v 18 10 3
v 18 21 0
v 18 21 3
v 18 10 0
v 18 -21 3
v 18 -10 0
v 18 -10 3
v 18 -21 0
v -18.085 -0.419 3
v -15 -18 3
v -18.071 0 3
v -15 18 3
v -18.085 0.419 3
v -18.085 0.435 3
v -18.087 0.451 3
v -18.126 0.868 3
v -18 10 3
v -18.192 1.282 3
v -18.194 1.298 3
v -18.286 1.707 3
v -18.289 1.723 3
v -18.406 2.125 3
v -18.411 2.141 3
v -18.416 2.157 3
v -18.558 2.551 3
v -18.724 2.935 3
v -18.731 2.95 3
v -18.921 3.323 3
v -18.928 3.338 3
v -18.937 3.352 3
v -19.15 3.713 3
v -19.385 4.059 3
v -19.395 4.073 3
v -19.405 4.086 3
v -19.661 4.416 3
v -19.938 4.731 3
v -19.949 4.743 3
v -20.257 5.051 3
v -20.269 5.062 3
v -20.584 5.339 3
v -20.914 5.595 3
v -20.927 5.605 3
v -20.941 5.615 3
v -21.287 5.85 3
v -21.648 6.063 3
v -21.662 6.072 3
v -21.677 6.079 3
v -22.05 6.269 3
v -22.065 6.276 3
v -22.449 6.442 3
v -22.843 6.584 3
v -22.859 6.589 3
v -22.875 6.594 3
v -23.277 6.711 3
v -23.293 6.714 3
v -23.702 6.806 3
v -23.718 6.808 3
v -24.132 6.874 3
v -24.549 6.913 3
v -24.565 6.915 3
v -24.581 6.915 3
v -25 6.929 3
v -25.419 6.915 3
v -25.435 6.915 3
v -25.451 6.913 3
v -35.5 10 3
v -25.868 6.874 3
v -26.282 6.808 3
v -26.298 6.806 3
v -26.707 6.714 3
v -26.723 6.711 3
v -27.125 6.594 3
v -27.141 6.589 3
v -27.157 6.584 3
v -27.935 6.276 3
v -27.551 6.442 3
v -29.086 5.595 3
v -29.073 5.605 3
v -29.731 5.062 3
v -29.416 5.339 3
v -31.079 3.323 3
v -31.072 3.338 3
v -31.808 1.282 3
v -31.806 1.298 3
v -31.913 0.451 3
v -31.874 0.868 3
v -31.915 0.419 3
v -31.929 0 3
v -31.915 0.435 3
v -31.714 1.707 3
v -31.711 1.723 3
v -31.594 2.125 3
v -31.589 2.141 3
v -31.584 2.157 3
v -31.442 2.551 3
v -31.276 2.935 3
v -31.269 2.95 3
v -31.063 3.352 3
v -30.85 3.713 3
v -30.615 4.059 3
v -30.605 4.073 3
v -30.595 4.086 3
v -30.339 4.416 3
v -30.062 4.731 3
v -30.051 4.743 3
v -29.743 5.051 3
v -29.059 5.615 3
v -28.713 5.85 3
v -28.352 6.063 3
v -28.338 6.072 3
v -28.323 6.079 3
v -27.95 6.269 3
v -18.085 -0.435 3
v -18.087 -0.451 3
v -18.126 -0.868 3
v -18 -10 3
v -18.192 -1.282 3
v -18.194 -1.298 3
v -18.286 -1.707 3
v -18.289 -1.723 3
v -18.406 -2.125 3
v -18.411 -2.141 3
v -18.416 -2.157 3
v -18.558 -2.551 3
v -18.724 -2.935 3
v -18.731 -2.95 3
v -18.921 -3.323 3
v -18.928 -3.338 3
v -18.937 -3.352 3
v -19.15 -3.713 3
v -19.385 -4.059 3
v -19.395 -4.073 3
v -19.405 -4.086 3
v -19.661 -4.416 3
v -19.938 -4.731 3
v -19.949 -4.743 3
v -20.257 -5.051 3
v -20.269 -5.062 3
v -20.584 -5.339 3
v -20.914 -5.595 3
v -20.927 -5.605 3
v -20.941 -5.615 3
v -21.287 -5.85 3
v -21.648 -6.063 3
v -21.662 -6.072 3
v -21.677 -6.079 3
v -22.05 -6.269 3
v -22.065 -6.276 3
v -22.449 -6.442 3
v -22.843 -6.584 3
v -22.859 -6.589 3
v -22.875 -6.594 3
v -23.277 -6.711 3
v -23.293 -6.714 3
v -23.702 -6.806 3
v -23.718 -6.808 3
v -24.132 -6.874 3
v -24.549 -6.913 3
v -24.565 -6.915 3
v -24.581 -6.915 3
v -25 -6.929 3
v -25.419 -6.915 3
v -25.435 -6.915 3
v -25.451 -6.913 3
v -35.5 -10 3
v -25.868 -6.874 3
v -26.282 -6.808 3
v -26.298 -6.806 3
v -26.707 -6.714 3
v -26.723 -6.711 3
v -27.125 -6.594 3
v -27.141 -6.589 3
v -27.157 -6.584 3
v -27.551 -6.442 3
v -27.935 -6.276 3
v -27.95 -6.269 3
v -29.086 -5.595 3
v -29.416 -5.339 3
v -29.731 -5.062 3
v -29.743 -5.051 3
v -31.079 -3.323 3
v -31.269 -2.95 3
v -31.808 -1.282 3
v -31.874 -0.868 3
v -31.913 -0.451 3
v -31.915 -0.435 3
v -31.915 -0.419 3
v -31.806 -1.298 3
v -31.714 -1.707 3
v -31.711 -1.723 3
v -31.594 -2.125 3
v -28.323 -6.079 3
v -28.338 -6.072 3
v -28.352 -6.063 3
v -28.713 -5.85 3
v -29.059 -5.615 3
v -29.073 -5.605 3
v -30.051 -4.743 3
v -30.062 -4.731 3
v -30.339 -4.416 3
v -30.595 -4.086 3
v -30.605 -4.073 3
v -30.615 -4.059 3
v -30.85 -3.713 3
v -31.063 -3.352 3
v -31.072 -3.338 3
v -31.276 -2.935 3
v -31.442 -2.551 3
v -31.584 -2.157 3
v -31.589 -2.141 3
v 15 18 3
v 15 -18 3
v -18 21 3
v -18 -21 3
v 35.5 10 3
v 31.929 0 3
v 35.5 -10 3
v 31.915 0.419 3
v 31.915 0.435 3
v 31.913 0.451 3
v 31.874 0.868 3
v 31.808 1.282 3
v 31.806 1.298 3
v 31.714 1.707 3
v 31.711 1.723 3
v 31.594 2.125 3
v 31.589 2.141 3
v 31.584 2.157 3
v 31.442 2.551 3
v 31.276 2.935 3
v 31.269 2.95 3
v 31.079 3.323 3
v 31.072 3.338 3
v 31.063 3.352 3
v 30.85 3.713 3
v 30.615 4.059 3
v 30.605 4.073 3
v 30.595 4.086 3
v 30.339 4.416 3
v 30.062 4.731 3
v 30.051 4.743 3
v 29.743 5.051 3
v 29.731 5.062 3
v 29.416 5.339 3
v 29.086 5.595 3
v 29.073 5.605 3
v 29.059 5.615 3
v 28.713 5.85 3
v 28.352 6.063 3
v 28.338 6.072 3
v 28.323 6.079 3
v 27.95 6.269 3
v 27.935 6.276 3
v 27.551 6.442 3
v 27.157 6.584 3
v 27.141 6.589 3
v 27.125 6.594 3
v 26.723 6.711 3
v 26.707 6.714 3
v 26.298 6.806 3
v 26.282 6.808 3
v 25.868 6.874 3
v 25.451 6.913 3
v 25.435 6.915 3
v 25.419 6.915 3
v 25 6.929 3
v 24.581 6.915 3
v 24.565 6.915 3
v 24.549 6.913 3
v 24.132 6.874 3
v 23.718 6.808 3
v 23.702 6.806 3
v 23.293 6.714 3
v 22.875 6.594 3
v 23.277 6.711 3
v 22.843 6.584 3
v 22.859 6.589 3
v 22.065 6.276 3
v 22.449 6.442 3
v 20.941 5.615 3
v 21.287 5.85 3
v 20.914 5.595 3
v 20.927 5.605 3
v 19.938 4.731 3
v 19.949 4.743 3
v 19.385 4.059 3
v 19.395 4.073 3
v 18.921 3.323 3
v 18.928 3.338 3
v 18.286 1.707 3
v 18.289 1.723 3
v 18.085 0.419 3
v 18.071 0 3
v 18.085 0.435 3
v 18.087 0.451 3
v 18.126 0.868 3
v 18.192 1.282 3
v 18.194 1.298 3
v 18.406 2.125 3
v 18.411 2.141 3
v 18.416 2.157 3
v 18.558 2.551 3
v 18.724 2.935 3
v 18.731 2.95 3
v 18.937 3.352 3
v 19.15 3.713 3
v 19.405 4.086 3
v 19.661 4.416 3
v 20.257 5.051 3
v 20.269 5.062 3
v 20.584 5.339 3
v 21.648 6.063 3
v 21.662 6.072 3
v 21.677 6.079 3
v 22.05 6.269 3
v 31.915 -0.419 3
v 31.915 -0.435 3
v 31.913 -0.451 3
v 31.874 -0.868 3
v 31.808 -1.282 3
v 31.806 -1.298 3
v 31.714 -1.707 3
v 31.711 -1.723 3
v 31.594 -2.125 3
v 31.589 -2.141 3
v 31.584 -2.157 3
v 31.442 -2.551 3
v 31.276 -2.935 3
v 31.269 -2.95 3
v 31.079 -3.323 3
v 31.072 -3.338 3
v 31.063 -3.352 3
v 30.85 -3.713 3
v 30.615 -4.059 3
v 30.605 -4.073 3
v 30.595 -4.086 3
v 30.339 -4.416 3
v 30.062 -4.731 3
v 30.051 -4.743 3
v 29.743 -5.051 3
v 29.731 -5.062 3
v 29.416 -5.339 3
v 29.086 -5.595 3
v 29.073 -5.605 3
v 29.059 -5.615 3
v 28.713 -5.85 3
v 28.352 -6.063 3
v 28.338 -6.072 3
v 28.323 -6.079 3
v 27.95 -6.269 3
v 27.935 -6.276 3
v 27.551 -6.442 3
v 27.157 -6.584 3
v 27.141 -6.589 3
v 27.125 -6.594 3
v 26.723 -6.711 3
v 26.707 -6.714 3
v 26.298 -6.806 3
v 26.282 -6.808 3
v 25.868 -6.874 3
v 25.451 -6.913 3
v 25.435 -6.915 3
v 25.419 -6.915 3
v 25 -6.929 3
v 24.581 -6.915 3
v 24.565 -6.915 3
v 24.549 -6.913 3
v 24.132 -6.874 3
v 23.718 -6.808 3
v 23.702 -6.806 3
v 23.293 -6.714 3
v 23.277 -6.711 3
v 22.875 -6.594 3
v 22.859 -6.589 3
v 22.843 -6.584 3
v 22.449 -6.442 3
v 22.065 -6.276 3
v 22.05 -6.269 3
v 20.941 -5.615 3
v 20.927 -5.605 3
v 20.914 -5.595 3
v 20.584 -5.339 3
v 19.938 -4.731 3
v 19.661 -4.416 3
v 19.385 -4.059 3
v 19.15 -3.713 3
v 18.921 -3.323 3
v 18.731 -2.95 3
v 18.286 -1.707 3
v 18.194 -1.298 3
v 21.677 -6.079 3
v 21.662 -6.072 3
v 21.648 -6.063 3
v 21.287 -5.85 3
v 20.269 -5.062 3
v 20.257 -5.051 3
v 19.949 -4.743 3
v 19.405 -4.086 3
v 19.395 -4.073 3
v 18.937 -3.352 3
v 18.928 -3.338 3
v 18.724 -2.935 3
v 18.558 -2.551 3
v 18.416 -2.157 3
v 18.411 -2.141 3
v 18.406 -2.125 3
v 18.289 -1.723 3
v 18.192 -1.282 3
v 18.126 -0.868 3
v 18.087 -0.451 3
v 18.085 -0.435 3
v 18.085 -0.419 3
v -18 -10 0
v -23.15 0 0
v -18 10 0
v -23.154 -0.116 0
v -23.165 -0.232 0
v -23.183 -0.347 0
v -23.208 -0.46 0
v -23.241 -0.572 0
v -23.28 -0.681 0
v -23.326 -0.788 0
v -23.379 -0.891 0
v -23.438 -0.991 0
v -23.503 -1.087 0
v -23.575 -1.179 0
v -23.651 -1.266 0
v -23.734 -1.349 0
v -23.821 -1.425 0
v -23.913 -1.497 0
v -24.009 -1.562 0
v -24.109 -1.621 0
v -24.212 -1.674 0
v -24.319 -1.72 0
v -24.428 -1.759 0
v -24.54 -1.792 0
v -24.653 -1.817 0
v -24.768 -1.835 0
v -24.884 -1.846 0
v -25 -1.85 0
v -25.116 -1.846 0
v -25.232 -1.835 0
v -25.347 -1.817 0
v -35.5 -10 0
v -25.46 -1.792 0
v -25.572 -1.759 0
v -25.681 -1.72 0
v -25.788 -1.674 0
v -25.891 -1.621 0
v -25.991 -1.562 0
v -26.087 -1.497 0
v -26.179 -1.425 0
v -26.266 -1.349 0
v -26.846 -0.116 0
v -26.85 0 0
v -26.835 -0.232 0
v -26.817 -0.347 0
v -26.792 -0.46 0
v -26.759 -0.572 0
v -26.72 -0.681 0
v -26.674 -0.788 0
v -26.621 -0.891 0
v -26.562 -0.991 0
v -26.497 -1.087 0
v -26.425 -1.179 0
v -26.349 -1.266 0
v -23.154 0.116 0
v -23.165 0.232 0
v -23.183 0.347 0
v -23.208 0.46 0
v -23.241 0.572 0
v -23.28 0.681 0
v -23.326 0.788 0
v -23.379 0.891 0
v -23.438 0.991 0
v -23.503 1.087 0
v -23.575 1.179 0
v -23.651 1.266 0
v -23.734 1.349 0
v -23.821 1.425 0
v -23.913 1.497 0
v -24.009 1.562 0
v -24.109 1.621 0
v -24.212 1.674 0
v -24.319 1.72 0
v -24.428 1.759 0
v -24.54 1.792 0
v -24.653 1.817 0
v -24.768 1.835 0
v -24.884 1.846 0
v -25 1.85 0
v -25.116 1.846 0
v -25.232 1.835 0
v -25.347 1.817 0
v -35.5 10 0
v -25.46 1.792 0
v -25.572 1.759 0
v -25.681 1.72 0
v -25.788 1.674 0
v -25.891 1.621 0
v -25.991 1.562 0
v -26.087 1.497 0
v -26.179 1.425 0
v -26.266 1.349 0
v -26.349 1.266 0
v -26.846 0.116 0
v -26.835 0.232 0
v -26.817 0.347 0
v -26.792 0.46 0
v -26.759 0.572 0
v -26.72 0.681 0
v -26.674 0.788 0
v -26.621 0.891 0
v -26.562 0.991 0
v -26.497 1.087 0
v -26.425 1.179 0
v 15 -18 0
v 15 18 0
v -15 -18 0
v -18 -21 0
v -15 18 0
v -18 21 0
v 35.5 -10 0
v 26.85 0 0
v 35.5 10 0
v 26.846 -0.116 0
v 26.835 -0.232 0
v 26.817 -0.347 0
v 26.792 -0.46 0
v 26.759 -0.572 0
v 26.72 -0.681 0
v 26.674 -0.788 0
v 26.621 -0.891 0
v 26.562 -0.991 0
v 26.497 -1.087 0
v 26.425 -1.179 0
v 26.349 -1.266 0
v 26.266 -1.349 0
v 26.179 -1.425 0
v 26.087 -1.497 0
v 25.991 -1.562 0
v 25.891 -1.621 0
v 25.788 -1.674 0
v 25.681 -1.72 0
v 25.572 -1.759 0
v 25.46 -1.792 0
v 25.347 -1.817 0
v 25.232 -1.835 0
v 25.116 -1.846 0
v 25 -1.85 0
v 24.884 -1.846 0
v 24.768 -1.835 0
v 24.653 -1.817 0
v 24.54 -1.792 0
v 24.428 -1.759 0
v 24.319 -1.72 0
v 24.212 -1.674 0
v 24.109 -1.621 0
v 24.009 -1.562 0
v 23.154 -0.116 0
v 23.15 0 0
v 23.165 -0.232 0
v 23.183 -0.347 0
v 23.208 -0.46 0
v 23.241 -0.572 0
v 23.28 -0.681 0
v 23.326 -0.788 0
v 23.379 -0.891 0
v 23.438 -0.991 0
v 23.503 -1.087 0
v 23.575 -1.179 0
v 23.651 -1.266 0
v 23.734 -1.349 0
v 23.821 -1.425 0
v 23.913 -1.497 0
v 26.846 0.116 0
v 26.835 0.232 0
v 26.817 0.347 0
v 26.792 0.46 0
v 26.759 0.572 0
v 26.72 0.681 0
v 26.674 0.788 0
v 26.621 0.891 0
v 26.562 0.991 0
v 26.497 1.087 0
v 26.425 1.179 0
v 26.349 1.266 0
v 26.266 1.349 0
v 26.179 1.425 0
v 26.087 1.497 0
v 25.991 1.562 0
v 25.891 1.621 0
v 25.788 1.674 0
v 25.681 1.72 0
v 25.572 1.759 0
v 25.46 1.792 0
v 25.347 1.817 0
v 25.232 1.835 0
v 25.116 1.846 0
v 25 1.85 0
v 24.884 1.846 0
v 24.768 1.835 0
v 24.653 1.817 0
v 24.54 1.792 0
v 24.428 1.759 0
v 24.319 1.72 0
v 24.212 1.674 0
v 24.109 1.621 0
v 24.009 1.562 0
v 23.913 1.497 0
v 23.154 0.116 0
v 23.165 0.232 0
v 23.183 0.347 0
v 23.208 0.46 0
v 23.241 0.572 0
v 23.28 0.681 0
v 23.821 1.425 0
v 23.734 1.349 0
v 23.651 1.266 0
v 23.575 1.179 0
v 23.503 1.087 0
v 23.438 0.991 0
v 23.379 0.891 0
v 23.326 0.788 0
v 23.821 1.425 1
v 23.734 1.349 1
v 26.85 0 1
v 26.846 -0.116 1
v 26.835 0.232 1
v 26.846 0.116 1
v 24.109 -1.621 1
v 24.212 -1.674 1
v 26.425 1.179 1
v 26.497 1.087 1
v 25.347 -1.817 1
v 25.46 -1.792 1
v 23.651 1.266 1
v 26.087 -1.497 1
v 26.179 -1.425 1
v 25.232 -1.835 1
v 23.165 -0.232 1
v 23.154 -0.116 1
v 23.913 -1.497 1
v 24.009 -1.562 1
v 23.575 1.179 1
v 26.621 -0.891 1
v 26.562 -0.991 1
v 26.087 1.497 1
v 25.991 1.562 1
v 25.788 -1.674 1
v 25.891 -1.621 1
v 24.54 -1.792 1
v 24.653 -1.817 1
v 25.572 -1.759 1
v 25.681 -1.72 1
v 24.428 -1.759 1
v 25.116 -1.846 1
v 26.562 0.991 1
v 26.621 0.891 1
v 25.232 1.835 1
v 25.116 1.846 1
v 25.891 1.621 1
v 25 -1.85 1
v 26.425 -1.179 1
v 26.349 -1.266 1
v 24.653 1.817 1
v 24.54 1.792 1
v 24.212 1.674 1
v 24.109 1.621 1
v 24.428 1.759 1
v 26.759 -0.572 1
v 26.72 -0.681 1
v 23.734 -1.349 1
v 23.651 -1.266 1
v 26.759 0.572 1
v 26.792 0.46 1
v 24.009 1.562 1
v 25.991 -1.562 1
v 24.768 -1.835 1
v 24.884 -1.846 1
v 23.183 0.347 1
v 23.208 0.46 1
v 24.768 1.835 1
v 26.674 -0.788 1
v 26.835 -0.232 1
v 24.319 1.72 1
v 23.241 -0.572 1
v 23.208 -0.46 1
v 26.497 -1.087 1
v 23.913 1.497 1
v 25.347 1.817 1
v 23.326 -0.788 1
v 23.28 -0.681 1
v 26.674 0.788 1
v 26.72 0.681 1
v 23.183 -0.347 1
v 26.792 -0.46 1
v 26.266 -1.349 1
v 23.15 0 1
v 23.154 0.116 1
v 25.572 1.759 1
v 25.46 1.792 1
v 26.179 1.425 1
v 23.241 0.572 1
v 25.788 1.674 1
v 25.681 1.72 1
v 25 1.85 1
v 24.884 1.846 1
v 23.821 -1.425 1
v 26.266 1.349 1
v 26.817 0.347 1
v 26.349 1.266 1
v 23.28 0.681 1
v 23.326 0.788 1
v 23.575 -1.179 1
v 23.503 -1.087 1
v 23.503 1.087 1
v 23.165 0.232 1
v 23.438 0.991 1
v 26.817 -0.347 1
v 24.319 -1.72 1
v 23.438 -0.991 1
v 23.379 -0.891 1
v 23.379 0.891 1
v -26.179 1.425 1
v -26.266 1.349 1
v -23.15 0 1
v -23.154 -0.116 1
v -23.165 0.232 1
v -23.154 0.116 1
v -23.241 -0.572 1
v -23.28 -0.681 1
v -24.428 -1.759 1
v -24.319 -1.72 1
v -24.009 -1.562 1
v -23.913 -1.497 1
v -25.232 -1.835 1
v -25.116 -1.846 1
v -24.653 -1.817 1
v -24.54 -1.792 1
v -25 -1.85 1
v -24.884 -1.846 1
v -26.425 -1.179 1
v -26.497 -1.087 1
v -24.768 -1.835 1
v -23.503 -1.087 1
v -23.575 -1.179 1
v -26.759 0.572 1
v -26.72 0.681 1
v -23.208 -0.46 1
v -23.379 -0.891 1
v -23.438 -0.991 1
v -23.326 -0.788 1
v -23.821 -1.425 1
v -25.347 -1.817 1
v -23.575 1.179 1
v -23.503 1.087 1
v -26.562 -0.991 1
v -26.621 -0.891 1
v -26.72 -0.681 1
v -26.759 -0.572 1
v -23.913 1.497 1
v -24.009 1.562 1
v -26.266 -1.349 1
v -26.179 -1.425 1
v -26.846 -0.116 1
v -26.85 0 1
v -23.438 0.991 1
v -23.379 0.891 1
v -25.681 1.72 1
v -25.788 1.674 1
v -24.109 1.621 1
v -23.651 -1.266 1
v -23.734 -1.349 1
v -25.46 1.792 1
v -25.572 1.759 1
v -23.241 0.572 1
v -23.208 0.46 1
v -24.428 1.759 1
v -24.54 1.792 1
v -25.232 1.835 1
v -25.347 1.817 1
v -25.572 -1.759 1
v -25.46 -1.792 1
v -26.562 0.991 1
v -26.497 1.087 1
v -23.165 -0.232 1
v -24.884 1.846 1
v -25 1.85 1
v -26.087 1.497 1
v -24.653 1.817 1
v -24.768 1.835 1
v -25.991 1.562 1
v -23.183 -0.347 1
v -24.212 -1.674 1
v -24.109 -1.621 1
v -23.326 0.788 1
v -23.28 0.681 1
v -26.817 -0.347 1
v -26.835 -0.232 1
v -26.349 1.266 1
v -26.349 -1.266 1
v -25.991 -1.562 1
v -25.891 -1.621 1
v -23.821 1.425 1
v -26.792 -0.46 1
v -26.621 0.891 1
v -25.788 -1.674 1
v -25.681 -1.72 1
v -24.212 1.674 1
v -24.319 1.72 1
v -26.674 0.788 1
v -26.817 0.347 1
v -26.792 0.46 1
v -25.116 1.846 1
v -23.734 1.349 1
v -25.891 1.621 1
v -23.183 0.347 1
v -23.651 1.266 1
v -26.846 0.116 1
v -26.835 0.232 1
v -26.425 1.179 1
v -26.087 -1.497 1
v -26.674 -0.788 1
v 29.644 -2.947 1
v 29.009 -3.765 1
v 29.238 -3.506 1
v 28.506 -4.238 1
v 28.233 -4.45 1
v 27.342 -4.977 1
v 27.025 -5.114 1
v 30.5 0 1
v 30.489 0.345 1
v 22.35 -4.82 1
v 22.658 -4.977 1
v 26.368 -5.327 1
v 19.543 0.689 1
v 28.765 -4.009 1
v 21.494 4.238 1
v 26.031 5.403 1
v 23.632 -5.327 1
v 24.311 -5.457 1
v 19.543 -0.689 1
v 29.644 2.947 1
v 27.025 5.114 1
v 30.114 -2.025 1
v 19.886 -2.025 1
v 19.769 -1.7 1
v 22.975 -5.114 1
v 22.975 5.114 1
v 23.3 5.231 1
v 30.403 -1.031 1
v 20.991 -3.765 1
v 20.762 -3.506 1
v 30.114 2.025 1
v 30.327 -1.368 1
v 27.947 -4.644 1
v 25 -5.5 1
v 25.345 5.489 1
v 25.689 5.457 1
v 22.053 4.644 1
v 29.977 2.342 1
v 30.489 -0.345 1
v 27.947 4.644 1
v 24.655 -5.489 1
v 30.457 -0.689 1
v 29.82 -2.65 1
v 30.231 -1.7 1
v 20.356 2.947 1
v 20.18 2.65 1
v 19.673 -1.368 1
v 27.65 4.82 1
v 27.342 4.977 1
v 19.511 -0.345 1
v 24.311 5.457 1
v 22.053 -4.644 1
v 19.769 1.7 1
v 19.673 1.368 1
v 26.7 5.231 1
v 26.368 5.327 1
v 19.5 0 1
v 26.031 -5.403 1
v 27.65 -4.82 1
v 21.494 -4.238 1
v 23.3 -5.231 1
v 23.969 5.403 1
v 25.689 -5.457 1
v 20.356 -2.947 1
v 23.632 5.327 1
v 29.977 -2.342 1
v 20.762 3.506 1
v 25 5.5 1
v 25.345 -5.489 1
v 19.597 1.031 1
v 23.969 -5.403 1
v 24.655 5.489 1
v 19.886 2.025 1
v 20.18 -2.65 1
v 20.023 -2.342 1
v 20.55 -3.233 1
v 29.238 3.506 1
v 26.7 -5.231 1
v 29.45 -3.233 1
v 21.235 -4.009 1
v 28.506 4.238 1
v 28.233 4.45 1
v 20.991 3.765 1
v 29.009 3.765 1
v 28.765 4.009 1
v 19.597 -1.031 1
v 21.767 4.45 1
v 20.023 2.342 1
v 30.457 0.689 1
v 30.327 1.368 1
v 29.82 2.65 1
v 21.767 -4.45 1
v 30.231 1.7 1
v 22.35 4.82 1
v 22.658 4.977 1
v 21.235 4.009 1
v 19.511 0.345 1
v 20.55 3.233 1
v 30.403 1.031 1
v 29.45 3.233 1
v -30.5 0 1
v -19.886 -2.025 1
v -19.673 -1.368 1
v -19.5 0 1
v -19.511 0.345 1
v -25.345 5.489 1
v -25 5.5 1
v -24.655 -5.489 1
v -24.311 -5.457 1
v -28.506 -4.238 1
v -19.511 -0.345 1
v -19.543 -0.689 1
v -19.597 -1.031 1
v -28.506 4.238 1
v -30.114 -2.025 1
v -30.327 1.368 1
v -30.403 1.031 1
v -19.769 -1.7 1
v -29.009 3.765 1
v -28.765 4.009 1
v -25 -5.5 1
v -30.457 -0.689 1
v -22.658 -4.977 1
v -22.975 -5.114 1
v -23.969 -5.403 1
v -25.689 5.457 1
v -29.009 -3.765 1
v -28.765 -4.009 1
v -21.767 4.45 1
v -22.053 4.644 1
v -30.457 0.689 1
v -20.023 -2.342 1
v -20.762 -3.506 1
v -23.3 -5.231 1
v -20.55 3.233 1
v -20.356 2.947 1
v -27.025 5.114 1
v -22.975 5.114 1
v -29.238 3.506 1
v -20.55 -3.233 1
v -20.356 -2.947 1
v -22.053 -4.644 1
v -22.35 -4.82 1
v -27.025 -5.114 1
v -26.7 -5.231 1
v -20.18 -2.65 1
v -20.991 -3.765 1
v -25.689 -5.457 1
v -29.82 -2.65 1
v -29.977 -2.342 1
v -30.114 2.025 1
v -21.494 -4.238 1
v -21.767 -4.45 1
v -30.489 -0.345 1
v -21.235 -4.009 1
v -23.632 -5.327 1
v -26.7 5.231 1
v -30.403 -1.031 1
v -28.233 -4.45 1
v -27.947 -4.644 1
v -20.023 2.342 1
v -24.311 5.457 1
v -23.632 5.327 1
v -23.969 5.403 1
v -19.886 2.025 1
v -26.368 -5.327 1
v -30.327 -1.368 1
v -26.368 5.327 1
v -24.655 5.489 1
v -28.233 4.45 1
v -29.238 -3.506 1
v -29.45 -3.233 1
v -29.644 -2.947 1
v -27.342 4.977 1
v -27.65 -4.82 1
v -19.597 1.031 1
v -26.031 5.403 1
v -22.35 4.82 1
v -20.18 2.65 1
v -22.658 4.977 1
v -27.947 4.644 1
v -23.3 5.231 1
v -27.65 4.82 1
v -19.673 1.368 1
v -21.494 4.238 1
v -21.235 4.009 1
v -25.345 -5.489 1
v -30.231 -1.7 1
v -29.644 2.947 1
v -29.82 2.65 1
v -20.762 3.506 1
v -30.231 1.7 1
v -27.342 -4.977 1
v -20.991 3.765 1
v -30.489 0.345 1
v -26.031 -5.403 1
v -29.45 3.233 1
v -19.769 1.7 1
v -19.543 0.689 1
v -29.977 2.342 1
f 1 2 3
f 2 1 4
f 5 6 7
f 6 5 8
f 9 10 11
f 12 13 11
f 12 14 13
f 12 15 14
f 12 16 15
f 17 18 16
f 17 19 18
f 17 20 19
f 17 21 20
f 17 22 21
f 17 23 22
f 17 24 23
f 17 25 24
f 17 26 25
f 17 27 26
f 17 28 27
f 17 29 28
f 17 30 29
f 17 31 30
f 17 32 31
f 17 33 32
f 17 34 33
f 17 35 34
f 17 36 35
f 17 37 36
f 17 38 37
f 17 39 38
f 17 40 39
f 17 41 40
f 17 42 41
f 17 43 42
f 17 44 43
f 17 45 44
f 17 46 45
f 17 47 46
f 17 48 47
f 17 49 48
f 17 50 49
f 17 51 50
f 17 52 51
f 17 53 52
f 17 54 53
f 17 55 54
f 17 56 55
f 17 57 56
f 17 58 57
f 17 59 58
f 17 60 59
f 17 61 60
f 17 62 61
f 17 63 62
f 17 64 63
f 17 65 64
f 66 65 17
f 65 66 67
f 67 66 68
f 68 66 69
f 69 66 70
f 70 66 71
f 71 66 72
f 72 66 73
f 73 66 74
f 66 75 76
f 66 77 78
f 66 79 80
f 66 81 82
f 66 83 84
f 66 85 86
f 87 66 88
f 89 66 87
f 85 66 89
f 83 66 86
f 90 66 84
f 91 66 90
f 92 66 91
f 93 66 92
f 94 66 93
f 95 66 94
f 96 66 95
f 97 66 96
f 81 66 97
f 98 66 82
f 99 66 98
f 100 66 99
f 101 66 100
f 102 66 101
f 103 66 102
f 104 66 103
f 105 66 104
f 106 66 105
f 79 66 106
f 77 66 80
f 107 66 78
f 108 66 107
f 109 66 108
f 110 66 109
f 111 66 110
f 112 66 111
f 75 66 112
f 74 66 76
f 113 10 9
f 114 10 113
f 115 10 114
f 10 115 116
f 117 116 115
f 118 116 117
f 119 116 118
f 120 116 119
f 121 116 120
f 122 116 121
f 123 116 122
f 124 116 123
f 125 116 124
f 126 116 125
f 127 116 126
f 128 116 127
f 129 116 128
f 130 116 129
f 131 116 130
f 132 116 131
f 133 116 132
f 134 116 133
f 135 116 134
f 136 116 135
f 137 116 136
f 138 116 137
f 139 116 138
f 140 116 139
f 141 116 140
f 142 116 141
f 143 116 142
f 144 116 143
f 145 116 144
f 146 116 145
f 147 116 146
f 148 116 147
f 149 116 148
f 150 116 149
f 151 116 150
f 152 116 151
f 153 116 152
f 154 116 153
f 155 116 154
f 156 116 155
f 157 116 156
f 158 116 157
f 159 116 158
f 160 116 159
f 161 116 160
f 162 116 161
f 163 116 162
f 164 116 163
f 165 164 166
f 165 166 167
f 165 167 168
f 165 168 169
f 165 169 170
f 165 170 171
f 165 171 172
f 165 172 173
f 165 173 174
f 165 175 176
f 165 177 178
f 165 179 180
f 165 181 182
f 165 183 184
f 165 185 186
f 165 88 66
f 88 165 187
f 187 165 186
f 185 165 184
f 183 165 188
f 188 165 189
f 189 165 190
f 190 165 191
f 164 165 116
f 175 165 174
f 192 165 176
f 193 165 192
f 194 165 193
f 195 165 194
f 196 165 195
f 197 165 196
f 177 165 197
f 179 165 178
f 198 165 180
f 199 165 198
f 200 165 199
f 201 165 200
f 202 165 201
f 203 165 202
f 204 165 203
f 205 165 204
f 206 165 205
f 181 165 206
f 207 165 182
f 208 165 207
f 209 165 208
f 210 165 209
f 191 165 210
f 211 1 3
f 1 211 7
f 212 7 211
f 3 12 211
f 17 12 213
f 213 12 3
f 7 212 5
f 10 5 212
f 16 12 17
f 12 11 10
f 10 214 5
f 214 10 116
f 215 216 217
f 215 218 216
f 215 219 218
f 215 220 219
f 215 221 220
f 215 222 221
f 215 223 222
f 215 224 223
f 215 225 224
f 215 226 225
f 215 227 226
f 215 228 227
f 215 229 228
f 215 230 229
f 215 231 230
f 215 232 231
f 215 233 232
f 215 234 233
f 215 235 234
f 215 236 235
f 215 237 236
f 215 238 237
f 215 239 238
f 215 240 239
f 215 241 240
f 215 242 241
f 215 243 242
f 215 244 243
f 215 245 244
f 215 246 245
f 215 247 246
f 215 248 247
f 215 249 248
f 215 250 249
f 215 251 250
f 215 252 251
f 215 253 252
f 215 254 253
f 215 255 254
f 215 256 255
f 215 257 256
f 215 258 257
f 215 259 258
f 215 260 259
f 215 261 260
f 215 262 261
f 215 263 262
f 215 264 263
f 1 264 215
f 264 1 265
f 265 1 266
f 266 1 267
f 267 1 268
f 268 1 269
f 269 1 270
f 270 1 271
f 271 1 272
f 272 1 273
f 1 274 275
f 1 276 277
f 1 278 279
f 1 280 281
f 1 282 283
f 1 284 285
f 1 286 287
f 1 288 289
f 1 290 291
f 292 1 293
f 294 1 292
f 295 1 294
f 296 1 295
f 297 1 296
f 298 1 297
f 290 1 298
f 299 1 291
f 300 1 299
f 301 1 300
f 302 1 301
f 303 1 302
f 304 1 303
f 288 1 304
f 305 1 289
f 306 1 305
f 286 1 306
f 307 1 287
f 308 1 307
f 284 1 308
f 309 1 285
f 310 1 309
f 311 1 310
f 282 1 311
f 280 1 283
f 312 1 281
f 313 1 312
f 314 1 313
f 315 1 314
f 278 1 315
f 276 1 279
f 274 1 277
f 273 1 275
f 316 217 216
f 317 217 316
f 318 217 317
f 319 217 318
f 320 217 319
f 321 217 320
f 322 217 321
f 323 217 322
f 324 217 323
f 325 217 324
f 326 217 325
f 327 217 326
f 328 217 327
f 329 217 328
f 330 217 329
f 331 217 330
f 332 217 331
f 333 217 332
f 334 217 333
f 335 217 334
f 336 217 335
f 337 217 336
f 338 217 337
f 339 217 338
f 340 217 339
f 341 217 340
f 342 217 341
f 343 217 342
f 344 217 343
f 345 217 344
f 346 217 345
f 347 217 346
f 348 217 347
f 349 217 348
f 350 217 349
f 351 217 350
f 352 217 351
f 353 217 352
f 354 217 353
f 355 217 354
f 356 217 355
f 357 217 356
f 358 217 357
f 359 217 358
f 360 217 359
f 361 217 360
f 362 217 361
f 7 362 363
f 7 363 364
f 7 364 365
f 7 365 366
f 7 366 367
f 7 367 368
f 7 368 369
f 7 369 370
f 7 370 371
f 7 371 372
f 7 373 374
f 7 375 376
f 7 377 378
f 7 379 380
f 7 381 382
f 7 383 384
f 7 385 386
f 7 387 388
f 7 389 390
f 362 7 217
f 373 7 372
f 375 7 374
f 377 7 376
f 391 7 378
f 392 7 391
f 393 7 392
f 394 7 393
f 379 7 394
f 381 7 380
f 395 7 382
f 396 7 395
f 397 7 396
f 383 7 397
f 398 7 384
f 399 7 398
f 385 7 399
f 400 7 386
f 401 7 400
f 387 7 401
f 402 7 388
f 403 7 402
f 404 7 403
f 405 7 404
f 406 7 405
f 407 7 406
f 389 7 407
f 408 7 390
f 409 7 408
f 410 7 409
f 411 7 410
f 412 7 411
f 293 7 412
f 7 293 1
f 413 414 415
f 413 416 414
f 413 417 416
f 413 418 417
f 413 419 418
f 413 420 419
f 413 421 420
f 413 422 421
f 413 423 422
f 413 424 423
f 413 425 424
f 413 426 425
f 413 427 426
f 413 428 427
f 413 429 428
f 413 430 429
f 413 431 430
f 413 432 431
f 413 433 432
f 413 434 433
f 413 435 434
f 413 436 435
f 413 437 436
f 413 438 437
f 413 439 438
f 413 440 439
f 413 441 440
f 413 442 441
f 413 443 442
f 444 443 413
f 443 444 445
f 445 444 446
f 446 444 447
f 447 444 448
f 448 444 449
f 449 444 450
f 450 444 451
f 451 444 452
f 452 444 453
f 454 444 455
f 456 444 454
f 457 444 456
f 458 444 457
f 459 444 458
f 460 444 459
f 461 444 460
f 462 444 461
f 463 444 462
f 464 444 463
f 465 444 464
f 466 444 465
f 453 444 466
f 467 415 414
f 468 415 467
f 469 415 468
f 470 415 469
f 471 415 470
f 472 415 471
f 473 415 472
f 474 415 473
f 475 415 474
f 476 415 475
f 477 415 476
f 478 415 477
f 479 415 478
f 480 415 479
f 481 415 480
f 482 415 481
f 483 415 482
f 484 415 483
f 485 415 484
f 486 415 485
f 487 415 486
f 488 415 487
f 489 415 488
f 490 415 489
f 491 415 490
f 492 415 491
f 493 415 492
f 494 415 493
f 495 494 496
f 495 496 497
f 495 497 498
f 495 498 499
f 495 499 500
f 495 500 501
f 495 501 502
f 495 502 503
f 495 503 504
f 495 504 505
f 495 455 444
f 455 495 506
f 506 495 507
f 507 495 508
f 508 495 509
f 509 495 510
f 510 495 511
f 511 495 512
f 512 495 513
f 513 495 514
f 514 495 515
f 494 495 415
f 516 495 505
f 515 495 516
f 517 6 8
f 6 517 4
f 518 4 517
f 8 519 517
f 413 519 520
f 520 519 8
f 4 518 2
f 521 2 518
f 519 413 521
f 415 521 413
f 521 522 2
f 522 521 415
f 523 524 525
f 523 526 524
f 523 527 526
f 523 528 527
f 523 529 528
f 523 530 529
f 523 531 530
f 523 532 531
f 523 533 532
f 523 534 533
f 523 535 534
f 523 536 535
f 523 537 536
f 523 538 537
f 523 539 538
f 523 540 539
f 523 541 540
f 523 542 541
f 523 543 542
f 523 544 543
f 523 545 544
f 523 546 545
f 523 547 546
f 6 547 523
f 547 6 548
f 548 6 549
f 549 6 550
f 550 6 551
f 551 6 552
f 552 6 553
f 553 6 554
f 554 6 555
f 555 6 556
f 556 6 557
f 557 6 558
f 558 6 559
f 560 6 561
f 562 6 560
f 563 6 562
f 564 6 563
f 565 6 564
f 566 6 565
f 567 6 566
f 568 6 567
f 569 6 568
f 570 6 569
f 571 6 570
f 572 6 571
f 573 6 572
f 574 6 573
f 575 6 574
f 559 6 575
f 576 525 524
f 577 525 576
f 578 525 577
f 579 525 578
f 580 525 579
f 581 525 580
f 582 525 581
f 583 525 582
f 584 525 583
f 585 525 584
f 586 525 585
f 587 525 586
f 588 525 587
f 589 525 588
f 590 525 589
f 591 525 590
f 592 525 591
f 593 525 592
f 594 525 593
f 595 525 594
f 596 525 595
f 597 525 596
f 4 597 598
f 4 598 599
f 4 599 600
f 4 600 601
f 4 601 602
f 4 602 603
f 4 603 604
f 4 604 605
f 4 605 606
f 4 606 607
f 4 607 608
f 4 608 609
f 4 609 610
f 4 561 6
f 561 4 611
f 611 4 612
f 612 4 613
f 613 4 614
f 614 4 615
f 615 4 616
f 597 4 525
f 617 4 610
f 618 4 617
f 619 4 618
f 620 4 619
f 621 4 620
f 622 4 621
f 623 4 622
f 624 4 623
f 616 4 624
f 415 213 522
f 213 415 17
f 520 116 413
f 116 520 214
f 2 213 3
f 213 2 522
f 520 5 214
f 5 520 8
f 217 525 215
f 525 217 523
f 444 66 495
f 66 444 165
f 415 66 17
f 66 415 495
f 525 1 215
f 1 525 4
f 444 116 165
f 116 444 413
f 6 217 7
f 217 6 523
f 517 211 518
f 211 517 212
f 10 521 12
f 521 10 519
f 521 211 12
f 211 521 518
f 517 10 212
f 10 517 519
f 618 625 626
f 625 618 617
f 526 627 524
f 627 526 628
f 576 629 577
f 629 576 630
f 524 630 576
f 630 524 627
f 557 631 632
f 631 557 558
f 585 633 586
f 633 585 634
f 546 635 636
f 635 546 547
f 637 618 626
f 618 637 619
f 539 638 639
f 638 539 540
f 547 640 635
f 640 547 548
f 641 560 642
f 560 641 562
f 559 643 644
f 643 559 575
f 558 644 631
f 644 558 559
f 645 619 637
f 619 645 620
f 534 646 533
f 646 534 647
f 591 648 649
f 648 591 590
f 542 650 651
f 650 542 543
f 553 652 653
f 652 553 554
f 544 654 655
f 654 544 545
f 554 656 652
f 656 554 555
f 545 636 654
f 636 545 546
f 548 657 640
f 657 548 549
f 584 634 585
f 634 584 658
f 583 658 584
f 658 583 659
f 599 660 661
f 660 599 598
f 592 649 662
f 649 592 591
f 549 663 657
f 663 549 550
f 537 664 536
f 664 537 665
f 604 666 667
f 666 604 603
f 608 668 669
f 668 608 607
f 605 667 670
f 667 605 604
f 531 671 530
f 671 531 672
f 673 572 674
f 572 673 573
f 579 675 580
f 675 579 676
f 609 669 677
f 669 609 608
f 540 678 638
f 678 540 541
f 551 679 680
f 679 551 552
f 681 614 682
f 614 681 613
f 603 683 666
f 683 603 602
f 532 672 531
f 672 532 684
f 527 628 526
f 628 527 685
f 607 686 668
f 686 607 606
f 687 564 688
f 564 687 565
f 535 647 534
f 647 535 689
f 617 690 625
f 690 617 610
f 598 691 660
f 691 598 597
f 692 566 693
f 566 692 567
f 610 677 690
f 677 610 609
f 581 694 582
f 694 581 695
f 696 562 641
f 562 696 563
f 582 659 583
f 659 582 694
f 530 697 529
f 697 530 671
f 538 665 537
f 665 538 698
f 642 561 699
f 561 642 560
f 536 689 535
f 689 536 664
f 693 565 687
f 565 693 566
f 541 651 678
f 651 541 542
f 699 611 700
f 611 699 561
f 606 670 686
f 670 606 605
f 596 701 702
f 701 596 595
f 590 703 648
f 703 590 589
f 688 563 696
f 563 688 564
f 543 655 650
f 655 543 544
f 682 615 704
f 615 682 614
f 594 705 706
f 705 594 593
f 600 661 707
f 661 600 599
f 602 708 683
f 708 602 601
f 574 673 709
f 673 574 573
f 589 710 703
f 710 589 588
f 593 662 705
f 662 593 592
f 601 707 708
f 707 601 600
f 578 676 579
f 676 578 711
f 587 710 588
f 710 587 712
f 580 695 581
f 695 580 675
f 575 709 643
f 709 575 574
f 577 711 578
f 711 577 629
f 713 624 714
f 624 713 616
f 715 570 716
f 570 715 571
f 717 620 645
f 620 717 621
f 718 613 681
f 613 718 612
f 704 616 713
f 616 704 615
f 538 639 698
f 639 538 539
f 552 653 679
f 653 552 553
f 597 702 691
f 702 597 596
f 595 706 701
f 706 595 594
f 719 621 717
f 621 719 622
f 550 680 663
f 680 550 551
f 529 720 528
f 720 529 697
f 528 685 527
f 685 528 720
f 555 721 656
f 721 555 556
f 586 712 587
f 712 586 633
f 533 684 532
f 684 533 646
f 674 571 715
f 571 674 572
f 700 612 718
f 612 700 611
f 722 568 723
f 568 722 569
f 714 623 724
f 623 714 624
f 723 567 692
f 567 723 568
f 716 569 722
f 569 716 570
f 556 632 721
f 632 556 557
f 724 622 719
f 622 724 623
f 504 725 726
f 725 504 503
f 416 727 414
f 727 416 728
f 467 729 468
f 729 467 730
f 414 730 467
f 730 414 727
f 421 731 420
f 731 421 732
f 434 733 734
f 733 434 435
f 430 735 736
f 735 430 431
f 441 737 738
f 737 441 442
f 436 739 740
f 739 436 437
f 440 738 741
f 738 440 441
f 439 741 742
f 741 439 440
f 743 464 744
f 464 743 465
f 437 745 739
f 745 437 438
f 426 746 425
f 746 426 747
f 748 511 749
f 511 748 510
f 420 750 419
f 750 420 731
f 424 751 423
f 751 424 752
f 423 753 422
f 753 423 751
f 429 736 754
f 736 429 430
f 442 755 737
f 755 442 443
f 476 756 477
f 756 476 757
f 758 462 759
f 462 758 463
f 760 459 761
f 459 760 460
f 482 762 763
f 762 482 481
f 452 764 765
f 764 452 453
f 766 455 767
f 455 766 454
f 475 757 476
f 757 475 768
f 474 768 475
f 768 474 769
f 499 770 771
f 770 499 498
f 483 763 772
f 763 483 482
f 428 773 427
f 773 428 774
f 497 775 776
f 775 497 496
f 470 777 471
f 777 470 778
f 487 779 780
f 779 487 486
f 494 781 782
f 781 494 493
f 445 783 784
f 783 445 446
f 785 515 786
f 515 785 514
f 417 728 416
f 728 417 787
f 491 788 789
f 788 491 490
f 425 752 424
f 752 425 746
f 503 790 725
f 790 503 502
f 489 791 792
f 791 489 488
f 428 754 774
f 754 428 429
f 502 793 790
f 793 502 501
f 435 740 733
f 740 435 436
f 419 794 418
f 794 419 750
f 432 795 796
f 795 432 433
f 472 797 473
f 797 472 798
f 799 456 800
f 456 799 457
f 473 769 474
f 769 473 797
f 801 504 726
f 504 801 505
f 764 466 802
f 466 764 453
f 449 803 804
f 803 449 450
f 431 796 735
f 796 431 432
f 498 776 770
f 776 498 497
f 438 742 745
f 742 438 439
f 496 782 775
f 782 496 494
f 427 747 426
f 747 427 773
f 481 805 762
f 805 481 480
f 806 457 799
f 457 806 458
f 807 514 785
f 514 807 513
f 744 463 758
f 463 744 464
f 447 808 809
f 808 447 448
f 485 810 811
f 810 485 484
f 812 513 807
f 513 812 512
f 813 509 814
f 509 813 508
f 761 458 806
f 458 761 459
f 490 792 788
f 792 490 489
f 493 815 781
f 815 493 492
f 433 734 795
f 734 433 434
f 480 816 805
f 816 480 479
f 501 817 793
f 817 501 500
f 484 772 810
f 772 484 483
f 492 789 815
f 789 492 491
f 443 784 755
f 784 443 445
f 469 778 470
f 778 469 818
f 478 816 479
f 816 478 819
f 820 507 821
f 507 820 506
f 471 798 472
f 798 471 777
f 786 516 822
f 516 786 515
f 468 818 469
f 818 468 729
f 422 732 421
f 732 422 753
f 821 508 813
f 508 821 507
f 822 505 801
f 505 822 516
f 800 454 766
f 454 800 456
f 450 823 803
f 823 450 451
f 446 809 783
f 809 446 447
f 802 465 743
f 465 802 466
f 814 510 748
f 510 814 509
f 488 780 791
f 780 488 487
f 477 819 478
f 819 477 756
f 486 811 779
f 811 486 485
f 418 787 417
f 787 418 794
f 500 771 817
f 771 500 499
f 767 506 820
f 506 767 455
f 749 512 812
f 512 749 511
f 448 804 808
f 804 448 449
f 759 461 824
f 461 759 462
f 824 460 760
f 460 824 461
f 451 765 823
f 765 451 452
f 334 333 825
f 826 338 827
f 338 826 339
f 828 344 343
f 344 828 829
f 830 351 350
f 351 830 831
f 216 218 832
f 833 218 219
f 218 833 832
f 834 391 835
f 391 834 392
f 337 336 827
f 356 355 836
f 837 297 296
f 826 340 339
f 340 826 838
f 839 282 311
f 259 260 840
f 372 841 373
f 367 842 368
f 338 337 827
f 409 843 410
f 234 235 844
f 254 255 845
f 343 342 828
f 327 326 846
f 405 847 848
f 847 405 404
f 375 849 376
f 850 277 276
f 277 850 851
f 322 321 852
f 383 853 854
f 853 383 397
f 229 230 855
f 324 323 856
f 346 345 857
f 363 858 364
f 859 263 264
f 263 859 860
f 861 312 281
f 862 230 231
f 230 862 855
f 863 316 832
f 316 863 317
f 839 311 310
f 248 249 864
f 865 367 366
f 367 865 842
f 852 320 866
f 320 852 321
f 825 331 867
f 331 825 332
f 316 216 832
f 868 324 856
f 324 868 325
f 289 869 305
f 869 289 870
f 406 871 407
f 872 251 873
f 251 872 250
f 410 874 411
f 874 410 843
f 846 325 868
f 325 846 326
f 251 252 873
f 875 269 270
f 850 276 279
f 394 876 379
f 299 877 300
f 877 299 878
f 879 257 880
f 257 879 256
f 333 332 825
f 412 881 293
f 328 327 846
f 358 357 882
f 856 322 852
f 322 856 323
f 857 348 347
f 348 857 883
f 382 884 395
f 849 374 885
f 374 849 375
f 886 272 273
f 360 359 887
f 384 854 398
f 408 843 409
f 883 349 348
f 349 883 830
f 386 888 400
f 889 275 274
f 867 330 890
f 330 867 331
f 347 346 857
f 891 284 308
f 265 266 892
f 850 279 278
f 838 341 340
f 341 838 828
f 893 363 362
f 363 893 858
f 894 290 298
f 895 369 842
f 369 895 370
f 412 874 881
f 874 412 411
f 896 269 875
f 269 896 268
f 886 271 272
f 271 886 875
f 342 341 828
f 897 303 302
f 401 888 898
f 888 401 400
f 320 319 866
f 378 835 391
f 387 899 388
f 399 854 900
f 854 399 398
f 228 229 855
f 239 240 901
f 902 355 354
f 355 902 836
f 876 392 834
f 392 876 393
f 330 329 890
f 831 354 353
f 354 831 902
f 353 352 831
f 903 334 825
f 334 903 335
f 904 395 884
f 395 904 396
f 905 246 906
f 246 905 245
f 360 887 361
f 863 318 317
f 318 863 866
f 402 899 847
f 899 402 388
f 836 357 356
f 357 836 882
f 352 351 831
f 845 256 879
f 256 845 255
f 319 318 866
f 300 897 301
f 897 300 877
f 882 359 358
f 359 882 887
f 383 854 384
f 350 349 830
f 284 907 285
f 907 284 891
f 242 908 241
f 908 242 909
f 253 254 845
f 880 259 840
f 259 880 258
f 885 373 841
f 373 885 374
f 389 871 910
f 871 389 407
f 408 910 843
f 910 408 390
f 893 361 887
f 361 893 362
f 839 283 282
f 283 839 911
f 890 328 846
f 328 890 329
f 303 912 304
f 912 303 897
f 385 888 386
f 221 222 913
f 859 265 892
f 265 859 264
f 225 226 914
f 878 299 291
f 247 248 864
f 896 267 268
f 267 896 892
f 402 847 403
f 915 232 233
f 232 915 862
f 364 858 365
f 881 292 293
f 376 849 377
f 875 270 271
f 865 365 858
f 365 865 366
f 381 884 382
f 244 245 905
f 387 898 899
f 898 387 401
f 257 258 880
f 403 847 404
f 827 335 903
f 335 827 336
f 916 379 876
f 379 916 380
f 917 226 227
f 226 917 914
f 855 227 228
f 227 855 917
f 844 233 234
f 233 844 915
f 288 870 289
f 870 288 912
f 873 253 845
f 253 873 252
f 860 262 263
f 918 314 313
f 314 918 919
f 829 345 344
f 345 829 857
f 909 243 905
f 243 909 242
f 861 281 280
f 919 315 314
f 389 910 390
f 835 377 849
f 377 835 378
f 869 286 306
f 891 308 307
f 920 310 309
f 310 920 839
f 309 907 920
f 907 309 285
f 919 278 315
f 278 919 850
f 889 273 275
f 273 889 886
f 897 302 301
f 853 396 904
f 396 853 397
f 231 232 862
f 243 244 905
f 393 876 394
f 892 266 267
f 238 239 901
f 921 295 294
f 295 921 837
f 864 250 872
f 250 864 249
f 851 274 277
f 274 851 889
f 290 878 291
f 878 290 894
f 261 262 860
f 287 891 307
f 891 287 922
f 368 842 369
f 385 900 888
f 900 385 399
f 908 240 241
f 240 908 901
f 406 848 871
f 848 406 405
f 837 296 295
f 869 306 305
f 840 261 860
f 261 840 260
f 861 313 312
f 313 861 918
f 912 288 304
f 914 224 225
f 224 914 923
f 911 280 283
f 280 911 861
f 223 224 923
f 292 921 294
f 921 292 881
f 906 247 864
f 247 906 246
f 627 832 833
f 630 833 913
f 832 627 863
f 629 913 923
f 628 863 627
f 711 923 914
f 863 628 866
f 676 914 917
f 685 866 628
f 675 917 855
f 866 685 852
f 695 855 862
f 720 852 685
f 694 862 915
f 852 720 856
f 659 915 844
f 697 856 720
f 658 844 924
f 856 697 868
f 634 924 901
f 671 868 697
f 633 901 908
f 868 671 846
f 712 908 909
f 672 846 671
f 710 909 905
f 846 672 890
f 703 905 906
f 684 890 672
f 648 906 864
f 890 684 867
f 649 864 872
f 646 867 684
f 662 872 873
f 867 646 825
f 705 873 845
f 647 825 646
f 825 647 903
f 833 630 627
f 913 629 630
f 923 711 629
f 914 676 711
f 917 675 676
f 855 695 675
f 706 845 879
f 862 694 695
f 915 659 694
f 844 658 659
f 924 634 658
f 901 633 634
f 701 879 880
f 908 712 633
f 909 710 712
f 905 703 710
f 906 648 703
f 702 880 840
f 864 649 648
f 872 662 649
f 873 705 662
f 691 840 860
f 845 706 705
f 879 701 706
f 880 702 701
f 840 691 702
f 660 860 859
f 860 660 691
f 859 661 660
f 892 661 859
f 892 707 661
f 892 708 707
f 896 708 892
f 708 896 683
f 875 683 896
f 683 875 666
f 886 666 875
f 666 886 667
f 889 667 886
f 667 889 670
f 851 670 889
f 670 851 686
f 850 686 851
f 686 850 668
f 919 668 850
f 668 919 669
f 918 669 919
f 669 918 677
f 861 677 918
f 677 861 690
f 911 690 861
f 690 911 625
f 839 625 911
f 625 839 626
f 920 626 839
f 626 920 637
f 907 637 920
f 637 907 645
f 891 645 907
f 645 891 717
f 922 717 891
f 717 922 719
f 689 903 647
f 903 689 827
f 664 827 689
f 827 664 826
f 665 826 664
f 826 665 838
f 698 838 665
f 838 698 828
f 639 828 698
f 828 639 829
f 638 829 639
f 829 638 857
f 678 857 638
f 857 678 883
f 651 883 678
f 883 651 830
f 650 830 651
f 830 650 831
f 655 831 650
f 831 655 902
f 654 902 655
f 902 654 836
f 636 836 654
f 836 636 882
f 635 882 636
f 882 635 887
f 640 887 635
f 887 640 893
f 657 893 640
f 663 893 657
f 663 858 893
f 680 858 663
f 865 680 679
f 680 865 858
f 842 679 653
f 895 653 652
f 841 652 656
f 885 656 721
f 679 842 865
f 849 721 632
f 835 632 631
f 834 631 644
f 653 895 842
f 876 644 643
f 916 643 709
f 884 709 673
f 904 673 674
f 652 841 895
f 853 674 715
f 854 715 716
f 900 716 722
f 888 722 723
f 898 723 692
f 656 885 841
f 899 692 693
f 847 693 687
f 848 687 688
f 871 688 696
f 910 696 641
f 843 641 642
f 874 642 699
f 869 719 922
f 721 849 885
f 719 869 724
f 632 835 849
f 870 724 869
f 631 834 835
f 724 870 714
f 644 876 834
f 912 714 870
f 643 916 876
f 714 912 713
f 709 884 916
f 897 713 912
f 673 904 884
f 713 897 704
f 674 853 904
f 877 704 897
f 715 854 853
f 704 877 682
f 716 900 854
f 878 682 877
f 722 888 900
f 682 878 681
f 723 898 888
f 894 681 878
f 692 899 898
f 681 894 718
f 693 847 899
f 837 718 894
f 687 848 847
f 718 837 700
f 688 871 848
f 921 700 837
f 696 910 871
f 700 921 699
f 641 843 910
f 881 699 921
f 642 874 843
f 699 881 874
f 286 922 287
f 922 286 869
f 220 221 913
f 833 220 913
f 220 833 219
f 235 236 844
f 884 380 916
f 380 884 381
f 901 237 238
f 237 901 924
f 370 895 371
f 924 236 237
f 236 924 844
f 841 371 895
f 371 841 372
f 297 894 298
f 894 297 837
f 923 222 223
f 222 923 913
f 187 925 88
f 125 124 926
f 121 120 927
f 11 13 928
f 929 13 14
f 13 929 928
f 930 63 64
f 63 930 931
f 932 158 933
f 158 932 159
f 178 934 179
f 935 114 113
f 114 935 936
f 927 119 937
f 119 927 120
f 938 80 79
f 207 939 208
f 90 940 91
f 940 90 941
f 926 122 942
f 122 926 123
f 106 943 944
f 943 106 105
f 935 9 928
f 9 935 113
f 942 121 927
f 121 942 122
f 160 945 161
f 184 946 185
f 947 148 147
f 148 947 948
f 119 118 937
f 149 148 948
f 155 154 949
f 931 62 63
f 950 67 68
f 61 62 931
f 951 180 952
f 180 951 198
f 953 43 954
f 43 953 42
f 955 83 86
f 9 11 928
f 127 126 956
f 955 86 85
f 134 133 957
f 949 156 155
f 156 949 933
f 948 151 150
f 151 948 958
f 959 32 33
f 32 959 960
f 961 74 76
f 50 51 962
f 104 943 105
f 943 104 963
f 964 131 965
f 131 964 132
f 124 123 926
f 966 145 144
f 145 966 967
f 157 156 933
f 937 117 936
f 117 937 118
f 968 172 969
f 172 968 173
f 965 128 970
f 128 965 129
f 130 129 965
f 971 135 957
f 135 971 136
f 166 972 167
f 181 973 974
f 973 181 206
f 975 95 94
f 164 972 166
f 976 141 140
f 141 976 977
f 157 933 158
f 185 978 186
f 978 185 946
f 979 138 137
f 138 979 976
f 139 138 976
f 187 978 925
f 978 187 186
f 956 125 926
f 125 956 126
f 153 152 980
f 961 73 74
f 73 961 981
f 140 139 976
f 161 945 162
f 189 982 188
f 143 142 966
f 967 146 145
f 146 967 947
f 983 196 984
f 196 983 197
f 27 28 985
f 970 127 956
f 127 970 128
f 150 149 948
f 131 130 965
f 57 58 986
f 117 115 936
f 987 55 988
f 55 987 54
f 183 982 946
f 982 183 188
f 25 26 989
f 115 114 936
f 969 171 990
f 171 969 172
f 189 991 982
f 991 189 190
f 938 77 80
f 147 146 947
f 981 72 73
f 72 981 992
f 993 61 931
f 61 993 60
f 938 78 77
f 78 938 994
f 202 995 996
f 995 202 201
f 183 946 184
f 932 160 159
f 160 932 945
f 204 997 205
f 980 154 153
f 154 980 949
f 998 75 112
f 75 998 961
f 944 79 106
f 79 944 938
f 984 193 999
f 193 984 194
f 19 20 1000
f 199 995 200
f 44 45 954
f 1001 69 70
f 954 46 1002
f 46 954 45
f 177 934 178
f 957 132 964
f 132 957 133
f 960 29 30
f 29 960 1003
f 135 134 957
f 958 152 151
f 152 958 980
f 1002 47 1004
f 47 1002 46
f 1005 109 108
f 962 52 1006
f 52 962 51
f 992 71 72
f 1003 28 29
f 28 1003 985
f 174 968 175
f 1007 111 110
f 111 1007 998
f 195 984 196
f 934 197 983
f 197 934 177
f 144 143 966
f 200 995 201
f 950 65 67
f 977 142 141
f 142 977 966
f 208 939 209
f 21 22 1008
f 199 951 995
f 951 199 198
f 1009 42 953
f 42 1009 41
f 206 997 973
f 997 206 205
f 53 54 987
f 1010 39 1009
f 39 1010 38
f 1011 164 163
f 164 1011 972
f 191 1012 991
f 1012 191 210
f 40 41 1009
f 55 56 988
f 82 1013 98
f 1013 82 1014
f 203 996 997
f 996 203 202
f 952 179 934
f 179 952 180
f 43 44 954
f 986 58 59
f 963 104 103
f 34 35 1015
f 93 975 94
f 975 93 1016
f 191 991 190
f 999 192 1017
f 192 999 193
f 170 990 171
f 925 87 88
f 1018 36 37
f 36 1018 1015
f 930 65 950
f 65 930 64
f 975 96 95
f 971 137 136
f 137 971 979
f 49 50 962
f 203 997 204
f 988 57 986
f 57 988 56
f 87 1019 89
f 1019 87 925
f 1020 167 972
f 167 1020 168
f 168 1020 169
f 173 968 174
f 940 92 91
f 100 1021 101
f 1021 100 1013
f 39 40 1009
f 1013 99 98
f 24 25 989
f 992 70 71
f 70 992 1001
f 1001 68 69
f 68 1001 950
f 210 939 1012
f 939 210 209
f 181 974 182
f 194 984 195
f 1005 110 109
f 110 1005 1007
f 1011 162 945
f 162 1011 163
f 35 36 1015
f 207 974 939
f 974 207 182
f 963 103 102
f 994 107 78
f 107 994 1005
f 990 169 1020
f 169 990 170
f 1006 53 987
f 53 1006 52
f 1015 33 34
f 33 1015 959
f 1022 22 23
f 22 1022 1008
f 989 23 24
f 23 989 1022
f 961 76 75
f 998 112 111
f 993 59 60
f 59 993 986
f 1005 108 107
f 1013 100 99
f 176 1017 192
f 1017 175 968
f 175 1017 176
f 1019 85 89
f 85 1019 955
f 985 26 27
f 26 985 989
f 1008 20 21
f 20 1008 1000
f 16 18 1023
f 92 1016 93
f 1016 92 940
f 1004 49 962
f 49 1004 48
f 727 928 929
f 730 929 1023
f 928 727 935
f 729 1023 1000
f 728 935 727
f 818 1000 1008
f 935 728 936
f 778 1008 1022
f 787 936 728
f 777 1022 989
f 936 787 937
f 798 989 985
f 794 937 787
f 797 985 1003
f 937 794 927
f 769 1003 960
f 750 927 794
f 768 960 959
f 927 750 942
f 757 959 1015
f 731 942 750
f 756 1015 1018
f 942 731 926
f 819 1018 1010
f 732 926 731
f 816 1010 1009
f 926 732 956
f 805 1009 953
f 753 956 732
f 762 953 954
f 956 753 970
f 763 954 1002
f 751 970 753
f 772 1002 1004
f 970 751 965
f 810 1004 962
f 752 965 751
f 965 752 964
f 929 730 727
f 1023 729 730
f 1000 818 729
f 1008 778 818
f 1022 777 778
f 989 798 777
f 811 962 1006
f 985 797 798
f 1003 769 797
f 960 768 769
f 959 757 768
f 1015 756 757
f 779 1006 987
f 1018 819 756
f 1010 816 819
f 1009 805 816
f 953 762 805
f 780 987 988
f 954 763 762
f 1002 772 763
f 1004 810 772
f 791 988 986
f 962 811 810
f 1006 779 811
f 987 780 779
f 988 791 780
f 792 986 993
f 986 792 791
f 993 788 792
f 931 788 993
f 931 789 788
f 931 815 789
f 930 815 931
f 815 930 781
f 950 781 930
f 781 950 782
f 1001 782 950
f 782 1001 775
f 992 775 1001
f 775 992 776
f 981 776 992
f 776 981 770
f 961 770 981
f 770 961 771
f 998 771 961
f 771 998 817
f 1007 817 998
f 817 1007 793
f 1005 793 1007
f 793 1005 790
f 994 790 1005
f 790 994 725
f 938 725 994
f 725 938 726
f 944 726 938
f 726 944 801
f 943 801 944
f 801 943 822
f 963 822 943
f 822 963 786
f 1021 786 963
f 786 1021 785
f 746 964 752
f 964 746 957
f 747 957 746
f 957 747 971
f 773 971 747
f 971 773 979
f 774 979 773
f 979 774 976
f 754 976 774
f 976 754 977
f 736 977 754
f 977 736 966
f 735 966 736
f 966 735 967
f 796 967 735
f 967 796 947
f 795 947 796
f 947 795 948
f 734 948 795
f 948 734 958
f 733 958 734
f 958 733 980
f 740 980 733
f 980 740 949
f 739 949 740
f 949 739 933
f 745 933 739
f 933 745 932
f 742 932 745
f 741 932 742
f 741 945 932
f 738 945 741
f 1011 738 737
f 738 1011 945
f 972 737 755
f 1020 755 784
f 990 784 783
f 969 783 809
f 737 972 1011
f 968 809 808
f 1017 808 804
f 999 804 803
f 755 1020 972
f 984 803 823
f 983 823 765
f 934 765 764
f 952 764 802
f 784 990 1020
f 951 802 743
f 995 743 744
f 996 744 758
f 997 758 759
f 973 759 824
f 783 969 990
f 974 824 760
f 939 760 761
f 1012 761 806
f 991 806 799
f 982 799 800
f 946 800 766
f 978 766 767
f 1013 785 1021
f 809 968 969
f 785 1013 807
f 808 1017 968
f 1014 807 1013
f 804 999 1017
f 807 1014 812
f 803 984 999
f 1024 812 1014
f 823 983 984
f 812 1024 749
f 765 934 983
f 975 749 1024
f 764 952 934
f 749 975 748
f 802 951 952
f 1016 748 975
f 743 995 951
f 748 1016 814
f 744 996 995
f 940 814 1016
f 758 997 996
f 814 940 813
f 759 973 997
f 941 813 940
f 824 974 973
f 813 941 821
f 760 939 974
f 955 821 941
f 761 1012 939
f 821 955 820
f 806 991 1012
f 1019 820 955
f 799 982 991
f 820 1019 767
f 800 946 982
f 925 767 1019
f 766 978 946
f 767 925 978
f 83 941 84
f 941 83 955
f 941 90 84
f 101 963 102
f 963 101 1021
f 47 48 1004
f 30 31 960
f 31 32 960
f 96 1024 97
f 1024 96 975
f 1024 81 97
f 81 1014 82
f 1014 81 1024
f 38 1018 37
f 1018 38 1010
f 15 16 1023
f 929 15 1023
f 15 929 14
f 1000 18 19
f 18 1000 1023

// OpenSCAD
difference(){
	union(){


        translate([-36/2,-42/2,0]){
              cube([36,42,3], center=false);
        }
        
        
     

        translate([-71/2,-10,0]){
            cube([71,20,3], center=false);
        }         

        translate([-40/2,-10,0]){
            cube([40,20,3], center=false);
        }         

    


	}
	union() {
        translate([-30/2,-36/2,-1]){
            cube([30,36,50], center=false);
       }

  
        translate([15+10,0,-1]){
            rotate([0,0,0]){
                cylinder(h=52, r=3.7/2, $fn=100, center=false);
            }
        }
        translate([-15-10,0,-1]){
            rotate([0,0,0]){
                cylinder(h=52, r=3.7/2, $fn=100, center=false);
            }
        }


        translate([15+10,0,1]){
            rotate([0,0,0]){
                cylinder(h=2.1, r1=5.5, r2=7, $fn=100, center=false);
            }
        }
        translate([-15-10,0,1]){
            rotate([0,0,0]){
                cylinder(h=2.1, r1=5.5, r2=7, $fn=100, center=false);
            }
        }


      
	}
}
